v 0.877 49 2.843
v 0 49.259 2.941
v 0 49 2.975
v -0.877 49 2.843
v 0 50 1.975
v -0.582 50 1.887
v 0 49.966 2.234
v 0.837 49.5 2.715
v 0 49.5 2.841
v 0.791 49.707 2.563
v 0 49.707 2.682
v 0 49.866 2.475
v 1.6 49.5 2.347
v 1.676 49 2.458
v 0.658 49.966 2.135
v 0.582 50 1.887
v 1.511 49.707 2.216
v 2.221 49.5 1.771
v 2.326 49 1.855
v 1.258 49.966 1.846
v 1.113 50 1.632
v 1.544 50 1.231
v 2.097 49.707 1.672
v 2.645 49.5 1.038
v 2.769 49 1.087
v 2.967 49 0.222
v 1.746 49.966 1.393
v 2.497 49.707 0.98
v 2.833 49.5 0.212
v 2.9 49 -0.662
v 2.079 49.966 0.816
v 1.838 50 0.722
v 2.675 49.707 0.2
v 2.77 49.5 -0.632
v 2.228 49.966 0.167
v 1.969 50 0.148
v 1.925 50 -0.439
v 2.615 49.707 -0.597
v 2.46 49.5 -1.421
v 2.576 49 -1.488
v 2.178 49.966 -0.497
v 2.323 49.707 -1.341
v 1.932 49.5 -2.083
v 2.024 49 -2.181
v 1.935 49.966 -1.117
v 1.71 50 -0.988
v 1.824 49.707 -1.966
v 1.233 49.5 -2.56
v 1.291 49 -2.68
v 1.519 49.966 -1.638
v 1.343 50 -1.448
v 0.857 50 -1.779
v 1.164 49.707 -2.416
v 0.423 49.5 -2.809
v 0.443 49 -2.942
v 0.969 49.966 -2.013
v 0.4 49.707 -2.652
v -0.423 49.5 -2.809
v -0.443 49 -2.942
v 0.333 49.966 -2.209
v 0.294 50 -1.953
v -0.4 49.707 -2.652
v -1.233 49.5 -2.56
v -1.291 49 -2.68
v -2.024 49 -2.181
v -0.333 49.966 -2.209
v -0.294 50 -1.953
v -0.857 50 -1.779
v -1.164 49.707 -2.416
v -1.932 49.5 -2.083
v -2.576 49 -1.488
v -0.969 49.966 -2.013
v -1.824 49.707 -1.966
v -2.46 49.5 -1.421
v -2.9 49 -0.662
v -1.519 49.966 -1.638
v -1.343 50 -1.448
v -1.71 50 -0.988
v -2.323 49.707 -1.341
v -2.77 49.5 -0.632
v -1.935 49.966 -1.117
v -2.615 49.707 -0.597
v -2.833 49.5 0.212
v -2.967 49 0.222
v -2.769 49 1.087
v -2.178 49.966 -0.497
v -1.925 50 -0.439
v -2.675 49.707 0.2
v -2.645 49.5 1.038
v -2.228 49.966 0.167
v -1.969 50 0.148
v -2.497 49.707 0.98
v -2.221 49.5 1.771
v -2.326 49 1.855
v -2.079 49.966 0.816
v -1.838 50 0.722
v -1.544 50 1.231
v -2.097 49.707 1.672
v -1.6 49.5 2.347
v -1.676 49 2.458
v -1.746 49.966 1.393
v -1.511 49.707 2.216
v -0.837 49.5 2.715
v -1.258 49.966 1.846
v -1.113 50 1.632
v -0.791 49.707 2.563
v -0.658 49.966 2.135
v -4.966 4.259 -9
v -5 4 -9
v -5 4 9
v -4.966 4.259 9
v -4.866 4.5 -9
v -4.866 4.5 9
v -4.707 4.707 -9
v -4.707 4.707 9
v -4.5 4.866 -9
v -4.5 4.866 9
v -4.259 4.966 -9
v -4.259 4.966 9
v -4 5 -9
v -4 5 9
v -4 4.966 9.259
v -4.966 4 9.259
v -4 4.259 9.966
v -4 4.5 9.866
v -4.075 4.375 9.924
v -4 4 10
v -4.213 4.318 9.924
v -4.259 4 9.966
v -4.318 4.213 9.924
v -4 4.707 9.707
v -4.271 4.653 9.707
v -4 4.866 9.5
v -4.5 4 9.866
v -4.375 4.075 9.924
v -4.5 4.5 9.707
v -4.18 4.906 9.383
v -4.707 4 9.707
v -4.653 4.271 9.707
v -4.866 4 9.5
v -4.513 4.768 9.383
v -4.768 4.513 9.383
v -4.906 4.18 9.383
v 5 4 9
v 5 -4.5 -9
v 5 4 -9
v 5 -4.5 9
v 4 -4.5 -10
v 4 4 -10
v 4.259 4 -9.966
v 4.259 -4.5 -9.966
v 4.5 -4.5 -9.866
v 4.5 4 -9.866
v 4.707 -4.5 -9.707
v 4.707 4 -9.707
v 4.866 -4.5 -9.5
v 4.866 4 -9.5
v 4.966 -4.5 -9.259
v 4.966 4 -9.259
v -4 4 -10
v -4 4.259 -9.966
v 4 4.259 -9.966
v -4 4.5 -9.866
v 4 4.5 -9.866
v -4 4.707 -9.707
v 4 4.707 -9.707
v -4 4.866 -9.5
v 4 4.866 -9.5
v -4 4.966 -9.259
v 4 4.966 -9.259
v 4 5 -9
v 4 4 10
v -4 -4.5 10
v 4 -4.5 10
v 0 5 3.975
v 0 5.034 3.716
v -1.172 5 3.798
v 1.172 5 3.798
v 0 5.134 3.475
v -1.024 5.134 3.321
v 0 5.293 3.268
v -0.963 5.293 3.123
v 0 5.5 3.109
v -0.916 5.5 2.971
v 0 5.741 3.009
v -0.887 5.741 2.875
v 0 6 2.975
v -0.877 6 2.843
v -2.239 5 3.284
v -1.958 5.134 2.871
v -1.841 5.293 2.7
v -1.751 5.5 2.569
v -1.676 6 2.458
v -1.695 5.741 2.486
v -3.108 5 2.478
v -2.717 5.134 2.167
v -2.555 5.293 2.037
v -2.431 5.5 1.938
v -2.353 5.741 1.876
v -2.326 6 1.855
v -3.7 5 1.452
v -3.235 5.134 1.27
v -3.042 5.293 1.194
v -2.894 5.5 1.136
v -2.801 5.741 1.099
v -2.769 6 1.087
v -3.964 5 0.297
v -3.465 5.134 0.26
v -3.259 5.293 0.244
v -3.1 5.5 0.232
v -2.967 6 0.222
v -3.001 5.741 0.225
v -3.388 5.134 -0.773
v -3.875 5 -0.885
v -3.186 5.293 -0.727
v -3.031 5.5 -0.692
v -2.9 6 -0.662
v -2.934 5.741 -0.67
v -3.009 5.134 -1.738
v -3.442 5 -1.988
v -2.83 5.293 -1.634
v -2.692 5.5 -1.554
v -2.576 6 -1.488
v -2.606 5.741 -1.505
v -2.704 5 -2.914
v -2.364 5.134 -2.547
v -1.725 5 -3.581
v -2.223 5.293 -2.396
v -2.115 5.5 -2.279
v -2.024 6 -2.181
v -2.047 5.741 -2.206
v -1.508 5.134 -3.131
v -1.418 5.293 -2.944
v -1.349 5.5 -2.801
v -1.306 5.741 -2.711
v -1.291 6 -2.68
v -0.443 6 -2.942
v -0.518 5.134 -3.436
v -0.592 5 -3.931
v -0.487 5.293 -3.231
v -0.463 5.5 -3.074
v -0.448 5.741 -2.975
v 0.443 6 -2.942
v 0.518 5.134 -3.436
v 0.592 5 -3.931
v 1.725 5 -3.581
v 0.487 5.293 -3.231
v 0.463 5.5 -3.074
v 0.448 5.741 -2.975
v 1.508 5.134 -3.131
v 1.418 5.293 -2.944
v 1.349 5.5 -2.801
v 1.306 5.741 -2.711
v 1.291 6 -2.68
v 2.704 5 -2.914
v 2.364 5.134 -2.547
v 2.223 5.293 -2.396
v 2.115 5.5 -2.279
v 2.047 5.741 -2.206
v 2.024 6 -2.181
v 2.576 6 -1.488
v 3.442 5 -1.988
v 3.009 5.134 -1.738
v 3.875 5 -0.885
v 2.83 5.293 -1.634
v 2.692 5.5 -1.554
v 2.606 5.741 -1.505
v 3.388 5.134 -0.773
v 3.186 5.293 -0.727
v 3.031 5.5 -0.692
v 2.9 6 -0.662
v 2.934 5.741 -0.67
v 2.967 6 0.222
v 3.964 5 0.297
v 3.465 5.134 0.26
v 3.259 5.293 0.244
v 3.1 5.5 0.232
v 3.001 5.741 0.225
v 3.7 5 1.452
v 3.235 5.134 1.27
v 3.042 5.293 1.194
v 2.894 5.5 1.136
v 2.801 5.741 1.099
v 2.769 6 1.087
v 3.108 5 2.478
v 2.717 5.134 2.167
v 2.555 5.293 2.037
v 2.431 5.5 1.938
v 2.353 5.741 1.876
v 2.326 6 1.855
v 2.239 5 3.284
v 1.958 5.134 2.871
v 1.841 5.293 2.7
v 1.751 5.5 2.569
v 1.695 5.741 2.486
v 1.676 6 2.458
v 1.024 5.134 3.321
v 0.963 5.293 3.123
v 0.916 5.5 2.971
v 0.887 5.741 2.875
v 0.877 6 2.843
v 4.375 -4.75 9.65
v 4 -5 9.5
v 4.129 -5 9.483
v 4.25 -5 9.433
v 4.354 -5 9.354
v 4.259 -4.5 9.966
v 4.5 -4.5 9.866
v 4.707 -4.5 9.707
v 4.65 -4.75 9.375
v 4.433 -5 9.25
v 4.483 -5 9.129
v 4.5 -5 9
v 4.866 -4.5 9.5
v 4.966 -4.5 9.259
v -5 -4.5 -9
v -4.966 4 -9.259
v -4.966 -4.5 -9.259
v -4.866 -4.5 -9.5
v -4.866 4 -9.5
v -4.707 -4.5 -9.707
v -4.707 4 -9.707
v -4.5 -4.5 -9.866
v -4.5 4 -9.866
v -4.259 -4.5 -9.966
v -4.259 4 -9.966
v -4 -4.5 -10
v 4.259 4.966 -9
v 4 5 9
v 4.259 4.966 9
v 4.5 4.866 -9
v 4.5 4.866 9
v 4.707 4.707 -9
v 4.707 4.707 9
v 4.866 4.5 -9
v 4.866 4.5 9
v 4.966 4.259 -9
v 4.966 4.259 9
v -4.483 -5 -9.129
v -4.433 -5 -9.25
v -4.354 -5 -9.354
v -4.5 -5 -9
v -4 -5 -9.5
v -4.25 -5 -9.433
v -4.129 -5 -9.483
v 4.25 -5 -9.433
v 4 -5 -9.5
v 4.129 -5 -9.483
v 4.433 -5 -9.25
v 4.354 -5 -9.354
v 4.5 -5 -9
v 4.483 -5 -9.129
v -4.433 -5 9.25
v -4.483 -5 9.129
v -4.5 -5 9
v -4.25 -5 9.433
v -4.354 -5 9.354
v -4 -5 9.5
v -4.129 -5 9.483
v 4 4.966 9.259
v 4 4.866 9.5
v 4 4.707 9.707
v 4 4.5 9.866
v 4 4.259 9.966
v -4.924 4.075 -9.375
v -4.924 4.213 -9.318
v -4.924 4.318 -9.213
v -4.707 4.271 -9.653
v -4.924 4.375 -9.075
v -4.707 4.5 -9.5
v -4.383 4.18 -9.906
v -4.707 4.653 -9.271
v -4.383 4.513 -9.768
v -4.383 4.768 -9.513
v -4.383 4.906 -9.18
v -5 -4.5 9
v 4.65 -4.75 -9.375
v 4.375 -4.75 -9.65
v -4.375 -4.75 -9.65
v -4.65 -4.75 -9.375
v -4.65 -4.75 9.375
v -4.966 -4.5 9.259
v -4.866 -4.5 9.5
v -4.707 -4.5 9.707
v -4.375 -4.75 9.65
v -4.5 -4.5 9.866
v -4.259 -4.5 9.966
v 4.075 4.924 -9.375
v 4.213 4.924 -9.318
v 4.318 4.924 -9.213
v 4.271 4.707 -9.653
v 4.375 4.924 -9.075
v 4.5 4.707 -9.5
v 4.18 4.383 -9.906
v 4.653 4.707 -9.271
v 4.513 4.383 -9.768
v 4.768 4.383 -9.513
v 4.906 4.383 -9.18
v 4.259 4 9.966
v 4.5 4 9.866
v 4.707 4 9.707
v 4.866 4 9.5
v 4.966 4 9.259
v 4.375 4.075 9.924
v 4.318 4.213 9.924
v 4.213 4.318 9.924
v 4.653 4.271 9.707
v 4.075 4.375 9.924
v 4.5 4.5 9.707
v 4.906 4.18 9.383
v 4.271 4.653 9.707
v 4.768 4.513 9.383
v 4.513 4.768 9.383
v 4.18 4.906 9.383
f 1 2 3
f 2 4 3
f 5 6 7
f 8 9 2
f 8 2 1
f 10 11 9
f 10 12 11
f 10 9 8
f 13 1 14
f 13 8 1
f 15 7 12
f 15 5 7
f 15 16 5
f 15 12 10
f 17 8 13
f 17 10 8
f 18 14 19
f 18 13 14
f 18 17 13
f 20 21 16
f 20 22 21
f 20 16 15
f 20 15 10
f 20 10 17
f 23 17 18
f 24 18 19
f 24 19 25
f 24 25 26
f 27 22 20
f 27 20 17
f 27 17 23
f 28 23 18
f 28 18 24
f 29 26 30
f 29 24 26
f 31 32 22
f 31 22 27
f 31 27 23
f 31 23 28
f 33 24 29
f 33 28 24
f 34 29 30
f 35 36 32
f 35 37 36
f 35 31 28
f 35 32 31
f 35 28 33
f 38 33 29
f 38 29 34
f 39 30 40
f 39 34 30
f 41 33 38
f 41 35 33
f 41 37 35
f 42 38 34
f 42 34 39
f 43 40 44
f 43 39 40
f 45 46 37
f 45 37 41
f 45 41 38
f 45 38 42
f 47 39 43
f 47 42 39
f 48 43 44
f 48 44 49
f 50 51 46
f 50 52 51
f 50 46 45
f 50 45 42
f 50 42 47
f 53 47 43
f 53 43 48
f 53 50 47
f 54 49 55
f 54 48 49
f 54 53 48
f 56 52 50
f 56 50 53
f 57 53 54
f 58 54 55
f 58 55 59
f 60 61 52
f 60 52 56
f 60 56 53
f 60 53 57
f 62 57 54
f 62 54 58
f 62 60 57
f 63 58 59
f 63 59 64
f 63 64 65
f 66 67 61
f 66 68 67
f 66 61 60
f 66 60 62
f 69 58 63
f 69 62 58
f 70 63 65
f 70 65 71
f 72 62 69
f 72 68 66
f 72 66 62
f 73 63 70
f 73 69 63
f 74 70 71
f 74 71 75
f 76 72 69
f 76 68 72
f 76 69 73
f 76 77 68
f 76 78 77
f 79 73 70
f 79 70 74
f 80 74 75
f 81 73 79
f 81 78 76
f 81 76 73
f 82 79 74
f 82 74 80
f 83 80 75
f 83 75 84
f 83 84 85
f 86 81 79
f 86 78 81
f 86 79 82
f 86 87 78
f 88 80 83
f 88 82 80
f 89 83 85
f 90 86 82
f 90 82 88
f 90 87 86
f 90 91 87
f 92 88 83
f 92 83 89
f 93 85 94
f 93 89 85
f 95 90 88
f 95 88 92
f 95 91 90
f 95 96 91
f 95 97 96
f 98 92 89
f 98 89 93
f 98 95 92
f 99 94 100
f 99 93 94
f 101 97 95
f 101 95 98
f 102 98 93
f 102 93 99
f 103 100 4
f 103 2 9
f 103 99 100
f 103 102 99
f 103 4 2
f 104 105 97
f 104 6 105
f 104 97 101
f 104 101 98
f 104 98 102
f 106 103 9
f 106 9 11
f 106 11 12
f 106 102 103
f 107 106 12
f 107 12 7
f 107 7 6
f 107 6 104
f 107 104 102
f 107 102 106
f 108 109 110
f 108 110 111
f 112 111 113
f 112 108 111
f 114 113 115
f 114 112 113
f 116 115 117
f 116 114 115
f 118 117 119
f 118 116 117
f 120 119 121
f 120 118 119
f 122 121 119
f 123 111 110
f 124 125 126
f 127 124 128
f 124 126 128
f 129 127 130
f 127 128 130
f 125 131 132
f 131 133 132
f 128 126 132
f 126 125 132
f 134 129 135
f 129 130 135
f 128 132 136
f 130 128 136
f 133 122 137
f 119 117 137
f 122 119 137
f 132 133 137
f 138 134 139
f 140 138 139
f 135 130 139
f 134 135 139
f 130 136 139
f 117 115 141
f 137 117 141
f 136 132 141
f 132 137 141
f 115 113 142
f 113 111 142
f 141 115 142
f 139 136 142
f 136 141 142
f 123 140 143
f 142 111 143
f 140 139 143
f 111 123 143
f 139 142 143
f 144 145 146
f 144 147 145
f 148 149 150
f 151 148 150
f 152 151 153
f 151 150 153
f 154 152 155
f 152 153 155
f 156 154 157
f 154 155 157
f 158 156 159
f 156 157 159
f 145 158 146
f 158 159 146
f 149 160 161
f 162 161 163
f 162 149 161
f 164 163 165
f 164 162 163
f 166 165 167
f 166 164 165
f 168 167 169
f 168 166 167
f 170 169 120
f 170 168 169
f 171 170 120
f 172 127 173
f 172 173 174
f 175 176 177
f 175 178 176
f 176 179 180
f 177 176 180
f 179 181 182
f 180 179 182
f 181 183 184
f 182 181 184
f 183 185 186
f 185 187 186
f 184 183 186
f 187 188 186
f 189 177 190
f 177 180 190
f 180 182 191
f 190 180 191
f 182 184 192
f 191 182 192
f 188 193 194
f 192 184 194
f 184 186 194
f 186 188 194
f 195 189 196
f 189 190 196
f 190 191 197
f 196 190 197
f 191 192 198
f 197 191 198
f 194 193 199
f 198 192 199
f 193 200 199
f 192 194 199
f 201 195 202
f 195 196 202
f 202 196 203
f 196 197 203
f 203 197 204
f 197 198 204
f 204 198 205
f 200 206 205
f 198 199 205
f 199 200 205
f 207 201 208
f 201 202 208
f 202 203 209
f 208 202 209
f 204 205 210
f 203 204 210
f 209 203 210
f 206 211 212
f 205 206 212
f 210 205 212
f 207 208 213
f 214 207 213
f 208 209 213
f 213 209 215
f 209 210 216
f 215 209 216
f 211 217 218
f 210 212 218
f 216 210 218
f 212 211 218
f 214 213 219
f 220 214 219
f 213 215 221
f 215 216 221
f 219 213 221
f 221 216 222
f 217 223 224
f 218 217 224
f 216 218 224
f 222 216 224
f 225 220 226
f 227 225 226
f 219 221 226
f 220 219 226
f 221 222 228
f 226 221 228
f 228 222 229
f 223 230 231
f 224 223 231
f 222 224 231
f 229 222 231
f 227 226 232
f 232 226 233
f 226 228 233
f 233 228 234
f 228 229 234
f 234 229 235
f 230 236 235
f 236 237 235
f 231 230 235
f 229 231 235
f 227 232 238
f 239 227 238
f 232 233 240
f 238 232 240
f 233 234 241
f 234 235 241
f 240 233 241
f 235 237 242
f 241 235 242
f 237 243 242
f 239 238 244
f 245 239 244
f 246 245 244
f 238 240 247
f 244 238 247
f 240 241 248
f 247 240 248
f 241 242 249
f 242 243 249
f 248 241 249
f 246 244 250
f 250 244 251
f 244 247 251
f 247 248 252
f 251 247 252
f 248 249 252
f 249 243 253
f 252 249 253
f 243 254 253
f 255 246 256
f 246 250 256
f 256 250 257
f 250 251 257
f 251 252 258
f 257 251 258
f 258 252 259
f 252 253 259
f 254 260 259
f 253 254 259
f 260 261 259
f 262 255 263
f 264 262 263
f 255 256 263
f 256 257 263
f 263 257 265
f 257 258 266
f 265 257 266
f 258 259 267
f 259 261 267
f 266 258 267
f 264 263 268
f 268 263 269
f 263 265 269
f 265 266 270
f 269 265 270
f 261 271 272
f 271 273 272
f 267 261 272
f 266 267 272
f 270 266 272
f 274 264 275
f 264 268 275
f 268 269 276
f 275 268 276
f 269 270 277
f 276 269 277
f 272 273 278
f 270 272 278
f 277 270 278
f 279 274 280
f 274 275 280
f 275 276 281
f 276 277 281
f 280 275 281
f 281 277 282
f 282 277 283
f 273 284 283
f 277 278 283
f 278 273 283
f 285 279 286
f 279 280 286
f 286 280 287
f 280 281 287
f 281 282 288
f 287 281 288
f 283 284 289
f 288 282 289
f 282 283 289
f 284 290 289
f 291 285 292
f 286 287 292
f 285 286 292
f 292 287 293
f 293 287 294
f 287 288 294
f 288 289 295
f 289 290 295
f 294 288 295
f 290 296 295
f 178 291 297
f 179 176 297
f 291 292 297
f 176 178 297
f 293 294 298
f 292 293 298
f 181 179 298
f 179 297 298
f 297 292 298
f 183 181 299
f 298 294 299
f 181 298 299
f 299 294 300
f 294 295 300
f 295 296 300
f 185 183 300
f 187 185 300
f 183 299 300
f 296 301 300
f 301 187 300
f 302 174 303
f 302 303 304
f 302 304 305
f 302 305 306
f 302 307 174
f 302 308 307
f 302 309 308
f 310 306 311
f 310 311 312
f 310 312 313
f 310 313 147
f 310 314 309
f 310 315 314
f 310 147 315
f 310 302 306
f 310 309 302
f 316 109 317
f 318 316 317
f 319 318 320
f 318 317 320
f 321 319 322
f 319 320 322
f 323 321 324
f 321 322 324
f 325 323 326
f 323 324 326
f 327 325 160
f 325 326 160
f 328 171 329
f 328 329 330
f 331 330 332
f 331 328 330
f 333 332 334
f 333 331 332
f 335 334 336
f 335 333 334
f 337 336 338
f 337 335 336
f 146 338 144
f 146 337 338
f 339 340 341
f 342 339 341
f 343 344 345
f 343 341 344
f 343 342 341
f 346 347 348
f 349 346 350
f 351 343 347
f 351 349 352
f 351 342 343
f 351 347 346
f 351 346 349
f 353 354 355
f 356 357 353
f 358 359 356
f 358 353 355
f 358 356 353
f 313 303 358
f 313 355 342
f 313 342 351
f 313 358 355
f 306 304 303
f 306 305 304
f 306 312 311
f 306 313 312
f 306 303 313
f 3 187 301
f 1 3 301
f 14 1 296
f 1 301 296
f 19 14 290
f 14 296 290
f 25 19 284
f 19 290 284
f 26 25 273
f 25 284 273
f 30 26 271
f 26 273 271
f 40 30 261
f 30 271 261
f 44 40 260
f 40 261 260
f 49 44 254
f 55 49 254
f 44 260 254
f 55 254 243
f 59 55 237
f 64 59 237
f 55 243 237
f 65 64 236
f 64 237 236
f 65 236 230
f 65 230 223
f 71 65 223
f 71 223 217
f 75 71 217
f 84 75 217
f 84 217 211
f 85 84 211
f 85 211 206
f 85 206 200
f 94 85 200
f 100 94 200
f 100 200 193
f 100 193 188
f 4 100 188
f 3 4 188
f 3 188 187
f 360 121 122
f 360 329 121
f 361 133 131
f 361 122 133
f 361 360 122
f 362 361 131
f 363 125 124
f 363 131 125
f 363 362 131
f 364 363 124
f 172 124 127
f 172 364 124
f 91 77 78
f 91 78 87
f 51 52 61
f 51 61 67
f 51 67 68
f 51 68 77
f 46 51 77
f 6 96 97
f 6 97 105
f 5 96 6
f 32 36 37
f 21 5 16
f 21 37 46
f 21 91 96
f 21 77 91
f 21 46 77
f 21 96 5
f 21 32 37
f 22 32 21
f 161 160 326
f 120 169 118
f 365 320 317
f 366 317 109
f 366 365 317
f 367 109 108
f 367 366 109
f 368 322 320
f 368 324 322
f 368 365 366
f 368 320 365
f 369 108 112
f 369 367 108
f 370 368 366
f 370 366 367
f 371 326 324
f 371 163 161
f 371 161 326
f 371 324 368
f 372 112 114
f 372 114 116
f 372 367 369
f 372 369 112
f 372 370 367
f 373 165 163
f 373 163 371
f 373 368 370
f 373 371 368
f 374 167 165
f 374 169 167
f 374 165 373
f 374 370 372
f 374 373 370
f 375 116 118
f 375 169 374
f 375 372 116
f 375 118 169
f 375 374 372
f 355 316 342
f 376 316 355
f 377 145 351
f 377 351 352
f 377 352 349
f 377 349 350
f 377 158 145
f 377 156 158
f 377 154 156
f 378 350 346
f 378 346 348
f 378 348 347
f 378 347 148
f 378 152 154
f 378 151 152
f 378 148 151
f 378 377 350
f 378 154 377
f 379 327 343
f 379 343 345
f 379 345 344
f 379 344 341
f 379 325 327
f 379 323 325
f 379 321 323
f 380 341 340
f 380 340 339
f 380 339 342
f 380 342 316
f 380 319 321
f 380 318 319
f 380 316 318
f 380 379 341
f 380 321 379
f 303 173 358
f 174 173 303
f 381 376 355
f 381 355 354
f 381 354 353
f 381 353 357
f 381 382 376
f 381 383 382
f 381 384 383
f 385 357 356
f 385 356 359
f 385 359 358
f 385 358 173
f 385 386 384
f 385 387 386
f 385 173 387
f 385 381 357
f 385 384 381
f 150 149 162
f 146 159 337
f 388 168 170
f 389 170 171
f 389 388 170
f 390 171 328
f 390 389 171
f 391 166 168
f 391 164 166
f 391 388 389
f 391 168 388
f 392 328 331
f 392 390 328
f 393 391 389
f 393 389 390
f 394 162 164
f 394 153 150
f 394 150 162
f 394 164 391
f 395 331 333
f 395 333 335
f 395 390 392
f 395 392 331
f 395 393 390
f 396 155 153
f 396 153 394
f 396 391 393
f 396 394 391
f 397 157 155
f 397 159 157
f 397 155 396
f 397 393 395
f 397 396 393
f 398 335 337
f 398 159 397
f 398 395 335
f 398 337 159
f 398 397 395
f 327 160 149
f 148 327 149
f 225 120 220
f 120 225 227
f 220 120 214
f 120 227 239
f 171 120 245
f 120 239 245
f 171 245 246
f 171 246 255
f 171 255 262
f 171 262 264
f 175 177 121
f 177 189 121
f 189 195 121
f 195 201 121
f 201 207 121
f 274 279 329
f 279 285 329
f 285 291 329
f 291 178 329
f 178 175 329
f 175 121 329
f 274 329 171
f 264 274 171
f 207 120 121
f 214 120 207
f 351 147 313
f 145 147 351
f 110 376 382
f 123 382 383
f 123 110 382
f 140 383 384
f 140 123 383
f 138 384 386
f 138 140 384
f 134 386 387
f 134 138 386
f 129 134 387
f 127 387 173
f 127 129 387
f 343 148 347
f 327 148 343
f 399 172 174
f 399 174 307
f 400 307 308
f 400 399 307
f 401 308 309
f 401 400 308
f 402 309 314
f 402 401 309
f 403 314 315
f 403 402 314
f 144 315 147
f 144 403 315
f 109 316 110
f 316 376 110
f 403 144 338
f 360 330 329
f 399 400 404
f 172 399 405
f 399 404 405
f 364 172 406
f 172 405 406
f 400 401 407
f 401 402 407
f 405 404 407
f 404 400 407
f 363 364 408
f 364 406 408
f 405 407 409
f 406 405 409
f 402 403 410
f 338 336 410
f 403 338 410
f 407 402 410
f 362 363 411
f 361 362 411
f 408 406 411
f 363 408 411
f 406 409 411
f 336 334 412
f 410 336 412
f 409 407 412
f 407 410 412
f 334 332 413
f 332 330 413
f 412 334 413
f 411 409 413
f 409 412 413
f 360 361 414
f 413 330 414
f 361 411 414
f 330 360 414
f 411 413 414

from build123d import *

# Parameters (mm, degrees)
SKETCH1_R           = 2.975
BOSS_EXTRUDE1_DEPTH = 50
SKETCH2_W           = 10.000004986
SKETCH2_H           = 10.000004986
BOSS_EXTRUDE2_DEPTH = 10
FILLET1_R           = 1
CHAMFER1_SIZE       = 0.5


with BuildPart() as part:
    # Sketch1 → Boss-Extrude1 (new body)
    with BuildSketch(Plane(origin=(0, 0, 0), x_dir=(1, 0, 0), z_dir=(0, 1, 0))):
        with Locations(Location((0, 0, 0), (0, 0, 270))):
            Circle(SKETCH1_R)
    extrude(amount=BOSS_EXTRUDE1_DEPTH)

    # Sketch2 → Boss-Extrude2 (add, symmetric)
    with BuildSketch(Plane.XY):
        Rectangle(SKETCH2_W, SKETCH2_H)
    extrude(amount=BOSS_EXTRUDE2_DEPTH, both=True)

    # Fillet1
    fillet1_edges = [part.edges().sort_by_distance(p)[0] for p in [
        (0, 50, -2.975),
        (0, 5.000002493, -2.975),
        (5.000002493, 0, -10),
        (0, 5.000002493, -10),
        (5.000002493, 5.000002493, 0),
        (-5.000002493, 0, -10),
        (-5.000002493, 5.000002493, 0),
        (5.000002493, 0, 10),
        (0, 5.000002493, 10),
        (-5.000002493, 0, 10),
    ]]
    fillet(fillet1_edges, radius=FILLET1_R)

    # Chamfer1
    chamfer1_edges = [part.edges().sort_by_distance(p)[0] for p in [
        (0, -5.000002493, 10),
        (0, -5.000002493, -10),
        (5.000002493, -5.000002493, 0),
        (-5.000002493, -5.000002493, 0),
        (4.707109274, -5.000002493, 9.707106781),
        (4.707109274, -5.000002493, -9.707106781),
        (-4.707109274, -5.000002493, -9.707106781),
        (-4.707109274, -5.000002493, 9.707106781),
    ]]
    chamfer(chamfer1_edges, length=CHAMFER1_SIZE)


solid = part.part
